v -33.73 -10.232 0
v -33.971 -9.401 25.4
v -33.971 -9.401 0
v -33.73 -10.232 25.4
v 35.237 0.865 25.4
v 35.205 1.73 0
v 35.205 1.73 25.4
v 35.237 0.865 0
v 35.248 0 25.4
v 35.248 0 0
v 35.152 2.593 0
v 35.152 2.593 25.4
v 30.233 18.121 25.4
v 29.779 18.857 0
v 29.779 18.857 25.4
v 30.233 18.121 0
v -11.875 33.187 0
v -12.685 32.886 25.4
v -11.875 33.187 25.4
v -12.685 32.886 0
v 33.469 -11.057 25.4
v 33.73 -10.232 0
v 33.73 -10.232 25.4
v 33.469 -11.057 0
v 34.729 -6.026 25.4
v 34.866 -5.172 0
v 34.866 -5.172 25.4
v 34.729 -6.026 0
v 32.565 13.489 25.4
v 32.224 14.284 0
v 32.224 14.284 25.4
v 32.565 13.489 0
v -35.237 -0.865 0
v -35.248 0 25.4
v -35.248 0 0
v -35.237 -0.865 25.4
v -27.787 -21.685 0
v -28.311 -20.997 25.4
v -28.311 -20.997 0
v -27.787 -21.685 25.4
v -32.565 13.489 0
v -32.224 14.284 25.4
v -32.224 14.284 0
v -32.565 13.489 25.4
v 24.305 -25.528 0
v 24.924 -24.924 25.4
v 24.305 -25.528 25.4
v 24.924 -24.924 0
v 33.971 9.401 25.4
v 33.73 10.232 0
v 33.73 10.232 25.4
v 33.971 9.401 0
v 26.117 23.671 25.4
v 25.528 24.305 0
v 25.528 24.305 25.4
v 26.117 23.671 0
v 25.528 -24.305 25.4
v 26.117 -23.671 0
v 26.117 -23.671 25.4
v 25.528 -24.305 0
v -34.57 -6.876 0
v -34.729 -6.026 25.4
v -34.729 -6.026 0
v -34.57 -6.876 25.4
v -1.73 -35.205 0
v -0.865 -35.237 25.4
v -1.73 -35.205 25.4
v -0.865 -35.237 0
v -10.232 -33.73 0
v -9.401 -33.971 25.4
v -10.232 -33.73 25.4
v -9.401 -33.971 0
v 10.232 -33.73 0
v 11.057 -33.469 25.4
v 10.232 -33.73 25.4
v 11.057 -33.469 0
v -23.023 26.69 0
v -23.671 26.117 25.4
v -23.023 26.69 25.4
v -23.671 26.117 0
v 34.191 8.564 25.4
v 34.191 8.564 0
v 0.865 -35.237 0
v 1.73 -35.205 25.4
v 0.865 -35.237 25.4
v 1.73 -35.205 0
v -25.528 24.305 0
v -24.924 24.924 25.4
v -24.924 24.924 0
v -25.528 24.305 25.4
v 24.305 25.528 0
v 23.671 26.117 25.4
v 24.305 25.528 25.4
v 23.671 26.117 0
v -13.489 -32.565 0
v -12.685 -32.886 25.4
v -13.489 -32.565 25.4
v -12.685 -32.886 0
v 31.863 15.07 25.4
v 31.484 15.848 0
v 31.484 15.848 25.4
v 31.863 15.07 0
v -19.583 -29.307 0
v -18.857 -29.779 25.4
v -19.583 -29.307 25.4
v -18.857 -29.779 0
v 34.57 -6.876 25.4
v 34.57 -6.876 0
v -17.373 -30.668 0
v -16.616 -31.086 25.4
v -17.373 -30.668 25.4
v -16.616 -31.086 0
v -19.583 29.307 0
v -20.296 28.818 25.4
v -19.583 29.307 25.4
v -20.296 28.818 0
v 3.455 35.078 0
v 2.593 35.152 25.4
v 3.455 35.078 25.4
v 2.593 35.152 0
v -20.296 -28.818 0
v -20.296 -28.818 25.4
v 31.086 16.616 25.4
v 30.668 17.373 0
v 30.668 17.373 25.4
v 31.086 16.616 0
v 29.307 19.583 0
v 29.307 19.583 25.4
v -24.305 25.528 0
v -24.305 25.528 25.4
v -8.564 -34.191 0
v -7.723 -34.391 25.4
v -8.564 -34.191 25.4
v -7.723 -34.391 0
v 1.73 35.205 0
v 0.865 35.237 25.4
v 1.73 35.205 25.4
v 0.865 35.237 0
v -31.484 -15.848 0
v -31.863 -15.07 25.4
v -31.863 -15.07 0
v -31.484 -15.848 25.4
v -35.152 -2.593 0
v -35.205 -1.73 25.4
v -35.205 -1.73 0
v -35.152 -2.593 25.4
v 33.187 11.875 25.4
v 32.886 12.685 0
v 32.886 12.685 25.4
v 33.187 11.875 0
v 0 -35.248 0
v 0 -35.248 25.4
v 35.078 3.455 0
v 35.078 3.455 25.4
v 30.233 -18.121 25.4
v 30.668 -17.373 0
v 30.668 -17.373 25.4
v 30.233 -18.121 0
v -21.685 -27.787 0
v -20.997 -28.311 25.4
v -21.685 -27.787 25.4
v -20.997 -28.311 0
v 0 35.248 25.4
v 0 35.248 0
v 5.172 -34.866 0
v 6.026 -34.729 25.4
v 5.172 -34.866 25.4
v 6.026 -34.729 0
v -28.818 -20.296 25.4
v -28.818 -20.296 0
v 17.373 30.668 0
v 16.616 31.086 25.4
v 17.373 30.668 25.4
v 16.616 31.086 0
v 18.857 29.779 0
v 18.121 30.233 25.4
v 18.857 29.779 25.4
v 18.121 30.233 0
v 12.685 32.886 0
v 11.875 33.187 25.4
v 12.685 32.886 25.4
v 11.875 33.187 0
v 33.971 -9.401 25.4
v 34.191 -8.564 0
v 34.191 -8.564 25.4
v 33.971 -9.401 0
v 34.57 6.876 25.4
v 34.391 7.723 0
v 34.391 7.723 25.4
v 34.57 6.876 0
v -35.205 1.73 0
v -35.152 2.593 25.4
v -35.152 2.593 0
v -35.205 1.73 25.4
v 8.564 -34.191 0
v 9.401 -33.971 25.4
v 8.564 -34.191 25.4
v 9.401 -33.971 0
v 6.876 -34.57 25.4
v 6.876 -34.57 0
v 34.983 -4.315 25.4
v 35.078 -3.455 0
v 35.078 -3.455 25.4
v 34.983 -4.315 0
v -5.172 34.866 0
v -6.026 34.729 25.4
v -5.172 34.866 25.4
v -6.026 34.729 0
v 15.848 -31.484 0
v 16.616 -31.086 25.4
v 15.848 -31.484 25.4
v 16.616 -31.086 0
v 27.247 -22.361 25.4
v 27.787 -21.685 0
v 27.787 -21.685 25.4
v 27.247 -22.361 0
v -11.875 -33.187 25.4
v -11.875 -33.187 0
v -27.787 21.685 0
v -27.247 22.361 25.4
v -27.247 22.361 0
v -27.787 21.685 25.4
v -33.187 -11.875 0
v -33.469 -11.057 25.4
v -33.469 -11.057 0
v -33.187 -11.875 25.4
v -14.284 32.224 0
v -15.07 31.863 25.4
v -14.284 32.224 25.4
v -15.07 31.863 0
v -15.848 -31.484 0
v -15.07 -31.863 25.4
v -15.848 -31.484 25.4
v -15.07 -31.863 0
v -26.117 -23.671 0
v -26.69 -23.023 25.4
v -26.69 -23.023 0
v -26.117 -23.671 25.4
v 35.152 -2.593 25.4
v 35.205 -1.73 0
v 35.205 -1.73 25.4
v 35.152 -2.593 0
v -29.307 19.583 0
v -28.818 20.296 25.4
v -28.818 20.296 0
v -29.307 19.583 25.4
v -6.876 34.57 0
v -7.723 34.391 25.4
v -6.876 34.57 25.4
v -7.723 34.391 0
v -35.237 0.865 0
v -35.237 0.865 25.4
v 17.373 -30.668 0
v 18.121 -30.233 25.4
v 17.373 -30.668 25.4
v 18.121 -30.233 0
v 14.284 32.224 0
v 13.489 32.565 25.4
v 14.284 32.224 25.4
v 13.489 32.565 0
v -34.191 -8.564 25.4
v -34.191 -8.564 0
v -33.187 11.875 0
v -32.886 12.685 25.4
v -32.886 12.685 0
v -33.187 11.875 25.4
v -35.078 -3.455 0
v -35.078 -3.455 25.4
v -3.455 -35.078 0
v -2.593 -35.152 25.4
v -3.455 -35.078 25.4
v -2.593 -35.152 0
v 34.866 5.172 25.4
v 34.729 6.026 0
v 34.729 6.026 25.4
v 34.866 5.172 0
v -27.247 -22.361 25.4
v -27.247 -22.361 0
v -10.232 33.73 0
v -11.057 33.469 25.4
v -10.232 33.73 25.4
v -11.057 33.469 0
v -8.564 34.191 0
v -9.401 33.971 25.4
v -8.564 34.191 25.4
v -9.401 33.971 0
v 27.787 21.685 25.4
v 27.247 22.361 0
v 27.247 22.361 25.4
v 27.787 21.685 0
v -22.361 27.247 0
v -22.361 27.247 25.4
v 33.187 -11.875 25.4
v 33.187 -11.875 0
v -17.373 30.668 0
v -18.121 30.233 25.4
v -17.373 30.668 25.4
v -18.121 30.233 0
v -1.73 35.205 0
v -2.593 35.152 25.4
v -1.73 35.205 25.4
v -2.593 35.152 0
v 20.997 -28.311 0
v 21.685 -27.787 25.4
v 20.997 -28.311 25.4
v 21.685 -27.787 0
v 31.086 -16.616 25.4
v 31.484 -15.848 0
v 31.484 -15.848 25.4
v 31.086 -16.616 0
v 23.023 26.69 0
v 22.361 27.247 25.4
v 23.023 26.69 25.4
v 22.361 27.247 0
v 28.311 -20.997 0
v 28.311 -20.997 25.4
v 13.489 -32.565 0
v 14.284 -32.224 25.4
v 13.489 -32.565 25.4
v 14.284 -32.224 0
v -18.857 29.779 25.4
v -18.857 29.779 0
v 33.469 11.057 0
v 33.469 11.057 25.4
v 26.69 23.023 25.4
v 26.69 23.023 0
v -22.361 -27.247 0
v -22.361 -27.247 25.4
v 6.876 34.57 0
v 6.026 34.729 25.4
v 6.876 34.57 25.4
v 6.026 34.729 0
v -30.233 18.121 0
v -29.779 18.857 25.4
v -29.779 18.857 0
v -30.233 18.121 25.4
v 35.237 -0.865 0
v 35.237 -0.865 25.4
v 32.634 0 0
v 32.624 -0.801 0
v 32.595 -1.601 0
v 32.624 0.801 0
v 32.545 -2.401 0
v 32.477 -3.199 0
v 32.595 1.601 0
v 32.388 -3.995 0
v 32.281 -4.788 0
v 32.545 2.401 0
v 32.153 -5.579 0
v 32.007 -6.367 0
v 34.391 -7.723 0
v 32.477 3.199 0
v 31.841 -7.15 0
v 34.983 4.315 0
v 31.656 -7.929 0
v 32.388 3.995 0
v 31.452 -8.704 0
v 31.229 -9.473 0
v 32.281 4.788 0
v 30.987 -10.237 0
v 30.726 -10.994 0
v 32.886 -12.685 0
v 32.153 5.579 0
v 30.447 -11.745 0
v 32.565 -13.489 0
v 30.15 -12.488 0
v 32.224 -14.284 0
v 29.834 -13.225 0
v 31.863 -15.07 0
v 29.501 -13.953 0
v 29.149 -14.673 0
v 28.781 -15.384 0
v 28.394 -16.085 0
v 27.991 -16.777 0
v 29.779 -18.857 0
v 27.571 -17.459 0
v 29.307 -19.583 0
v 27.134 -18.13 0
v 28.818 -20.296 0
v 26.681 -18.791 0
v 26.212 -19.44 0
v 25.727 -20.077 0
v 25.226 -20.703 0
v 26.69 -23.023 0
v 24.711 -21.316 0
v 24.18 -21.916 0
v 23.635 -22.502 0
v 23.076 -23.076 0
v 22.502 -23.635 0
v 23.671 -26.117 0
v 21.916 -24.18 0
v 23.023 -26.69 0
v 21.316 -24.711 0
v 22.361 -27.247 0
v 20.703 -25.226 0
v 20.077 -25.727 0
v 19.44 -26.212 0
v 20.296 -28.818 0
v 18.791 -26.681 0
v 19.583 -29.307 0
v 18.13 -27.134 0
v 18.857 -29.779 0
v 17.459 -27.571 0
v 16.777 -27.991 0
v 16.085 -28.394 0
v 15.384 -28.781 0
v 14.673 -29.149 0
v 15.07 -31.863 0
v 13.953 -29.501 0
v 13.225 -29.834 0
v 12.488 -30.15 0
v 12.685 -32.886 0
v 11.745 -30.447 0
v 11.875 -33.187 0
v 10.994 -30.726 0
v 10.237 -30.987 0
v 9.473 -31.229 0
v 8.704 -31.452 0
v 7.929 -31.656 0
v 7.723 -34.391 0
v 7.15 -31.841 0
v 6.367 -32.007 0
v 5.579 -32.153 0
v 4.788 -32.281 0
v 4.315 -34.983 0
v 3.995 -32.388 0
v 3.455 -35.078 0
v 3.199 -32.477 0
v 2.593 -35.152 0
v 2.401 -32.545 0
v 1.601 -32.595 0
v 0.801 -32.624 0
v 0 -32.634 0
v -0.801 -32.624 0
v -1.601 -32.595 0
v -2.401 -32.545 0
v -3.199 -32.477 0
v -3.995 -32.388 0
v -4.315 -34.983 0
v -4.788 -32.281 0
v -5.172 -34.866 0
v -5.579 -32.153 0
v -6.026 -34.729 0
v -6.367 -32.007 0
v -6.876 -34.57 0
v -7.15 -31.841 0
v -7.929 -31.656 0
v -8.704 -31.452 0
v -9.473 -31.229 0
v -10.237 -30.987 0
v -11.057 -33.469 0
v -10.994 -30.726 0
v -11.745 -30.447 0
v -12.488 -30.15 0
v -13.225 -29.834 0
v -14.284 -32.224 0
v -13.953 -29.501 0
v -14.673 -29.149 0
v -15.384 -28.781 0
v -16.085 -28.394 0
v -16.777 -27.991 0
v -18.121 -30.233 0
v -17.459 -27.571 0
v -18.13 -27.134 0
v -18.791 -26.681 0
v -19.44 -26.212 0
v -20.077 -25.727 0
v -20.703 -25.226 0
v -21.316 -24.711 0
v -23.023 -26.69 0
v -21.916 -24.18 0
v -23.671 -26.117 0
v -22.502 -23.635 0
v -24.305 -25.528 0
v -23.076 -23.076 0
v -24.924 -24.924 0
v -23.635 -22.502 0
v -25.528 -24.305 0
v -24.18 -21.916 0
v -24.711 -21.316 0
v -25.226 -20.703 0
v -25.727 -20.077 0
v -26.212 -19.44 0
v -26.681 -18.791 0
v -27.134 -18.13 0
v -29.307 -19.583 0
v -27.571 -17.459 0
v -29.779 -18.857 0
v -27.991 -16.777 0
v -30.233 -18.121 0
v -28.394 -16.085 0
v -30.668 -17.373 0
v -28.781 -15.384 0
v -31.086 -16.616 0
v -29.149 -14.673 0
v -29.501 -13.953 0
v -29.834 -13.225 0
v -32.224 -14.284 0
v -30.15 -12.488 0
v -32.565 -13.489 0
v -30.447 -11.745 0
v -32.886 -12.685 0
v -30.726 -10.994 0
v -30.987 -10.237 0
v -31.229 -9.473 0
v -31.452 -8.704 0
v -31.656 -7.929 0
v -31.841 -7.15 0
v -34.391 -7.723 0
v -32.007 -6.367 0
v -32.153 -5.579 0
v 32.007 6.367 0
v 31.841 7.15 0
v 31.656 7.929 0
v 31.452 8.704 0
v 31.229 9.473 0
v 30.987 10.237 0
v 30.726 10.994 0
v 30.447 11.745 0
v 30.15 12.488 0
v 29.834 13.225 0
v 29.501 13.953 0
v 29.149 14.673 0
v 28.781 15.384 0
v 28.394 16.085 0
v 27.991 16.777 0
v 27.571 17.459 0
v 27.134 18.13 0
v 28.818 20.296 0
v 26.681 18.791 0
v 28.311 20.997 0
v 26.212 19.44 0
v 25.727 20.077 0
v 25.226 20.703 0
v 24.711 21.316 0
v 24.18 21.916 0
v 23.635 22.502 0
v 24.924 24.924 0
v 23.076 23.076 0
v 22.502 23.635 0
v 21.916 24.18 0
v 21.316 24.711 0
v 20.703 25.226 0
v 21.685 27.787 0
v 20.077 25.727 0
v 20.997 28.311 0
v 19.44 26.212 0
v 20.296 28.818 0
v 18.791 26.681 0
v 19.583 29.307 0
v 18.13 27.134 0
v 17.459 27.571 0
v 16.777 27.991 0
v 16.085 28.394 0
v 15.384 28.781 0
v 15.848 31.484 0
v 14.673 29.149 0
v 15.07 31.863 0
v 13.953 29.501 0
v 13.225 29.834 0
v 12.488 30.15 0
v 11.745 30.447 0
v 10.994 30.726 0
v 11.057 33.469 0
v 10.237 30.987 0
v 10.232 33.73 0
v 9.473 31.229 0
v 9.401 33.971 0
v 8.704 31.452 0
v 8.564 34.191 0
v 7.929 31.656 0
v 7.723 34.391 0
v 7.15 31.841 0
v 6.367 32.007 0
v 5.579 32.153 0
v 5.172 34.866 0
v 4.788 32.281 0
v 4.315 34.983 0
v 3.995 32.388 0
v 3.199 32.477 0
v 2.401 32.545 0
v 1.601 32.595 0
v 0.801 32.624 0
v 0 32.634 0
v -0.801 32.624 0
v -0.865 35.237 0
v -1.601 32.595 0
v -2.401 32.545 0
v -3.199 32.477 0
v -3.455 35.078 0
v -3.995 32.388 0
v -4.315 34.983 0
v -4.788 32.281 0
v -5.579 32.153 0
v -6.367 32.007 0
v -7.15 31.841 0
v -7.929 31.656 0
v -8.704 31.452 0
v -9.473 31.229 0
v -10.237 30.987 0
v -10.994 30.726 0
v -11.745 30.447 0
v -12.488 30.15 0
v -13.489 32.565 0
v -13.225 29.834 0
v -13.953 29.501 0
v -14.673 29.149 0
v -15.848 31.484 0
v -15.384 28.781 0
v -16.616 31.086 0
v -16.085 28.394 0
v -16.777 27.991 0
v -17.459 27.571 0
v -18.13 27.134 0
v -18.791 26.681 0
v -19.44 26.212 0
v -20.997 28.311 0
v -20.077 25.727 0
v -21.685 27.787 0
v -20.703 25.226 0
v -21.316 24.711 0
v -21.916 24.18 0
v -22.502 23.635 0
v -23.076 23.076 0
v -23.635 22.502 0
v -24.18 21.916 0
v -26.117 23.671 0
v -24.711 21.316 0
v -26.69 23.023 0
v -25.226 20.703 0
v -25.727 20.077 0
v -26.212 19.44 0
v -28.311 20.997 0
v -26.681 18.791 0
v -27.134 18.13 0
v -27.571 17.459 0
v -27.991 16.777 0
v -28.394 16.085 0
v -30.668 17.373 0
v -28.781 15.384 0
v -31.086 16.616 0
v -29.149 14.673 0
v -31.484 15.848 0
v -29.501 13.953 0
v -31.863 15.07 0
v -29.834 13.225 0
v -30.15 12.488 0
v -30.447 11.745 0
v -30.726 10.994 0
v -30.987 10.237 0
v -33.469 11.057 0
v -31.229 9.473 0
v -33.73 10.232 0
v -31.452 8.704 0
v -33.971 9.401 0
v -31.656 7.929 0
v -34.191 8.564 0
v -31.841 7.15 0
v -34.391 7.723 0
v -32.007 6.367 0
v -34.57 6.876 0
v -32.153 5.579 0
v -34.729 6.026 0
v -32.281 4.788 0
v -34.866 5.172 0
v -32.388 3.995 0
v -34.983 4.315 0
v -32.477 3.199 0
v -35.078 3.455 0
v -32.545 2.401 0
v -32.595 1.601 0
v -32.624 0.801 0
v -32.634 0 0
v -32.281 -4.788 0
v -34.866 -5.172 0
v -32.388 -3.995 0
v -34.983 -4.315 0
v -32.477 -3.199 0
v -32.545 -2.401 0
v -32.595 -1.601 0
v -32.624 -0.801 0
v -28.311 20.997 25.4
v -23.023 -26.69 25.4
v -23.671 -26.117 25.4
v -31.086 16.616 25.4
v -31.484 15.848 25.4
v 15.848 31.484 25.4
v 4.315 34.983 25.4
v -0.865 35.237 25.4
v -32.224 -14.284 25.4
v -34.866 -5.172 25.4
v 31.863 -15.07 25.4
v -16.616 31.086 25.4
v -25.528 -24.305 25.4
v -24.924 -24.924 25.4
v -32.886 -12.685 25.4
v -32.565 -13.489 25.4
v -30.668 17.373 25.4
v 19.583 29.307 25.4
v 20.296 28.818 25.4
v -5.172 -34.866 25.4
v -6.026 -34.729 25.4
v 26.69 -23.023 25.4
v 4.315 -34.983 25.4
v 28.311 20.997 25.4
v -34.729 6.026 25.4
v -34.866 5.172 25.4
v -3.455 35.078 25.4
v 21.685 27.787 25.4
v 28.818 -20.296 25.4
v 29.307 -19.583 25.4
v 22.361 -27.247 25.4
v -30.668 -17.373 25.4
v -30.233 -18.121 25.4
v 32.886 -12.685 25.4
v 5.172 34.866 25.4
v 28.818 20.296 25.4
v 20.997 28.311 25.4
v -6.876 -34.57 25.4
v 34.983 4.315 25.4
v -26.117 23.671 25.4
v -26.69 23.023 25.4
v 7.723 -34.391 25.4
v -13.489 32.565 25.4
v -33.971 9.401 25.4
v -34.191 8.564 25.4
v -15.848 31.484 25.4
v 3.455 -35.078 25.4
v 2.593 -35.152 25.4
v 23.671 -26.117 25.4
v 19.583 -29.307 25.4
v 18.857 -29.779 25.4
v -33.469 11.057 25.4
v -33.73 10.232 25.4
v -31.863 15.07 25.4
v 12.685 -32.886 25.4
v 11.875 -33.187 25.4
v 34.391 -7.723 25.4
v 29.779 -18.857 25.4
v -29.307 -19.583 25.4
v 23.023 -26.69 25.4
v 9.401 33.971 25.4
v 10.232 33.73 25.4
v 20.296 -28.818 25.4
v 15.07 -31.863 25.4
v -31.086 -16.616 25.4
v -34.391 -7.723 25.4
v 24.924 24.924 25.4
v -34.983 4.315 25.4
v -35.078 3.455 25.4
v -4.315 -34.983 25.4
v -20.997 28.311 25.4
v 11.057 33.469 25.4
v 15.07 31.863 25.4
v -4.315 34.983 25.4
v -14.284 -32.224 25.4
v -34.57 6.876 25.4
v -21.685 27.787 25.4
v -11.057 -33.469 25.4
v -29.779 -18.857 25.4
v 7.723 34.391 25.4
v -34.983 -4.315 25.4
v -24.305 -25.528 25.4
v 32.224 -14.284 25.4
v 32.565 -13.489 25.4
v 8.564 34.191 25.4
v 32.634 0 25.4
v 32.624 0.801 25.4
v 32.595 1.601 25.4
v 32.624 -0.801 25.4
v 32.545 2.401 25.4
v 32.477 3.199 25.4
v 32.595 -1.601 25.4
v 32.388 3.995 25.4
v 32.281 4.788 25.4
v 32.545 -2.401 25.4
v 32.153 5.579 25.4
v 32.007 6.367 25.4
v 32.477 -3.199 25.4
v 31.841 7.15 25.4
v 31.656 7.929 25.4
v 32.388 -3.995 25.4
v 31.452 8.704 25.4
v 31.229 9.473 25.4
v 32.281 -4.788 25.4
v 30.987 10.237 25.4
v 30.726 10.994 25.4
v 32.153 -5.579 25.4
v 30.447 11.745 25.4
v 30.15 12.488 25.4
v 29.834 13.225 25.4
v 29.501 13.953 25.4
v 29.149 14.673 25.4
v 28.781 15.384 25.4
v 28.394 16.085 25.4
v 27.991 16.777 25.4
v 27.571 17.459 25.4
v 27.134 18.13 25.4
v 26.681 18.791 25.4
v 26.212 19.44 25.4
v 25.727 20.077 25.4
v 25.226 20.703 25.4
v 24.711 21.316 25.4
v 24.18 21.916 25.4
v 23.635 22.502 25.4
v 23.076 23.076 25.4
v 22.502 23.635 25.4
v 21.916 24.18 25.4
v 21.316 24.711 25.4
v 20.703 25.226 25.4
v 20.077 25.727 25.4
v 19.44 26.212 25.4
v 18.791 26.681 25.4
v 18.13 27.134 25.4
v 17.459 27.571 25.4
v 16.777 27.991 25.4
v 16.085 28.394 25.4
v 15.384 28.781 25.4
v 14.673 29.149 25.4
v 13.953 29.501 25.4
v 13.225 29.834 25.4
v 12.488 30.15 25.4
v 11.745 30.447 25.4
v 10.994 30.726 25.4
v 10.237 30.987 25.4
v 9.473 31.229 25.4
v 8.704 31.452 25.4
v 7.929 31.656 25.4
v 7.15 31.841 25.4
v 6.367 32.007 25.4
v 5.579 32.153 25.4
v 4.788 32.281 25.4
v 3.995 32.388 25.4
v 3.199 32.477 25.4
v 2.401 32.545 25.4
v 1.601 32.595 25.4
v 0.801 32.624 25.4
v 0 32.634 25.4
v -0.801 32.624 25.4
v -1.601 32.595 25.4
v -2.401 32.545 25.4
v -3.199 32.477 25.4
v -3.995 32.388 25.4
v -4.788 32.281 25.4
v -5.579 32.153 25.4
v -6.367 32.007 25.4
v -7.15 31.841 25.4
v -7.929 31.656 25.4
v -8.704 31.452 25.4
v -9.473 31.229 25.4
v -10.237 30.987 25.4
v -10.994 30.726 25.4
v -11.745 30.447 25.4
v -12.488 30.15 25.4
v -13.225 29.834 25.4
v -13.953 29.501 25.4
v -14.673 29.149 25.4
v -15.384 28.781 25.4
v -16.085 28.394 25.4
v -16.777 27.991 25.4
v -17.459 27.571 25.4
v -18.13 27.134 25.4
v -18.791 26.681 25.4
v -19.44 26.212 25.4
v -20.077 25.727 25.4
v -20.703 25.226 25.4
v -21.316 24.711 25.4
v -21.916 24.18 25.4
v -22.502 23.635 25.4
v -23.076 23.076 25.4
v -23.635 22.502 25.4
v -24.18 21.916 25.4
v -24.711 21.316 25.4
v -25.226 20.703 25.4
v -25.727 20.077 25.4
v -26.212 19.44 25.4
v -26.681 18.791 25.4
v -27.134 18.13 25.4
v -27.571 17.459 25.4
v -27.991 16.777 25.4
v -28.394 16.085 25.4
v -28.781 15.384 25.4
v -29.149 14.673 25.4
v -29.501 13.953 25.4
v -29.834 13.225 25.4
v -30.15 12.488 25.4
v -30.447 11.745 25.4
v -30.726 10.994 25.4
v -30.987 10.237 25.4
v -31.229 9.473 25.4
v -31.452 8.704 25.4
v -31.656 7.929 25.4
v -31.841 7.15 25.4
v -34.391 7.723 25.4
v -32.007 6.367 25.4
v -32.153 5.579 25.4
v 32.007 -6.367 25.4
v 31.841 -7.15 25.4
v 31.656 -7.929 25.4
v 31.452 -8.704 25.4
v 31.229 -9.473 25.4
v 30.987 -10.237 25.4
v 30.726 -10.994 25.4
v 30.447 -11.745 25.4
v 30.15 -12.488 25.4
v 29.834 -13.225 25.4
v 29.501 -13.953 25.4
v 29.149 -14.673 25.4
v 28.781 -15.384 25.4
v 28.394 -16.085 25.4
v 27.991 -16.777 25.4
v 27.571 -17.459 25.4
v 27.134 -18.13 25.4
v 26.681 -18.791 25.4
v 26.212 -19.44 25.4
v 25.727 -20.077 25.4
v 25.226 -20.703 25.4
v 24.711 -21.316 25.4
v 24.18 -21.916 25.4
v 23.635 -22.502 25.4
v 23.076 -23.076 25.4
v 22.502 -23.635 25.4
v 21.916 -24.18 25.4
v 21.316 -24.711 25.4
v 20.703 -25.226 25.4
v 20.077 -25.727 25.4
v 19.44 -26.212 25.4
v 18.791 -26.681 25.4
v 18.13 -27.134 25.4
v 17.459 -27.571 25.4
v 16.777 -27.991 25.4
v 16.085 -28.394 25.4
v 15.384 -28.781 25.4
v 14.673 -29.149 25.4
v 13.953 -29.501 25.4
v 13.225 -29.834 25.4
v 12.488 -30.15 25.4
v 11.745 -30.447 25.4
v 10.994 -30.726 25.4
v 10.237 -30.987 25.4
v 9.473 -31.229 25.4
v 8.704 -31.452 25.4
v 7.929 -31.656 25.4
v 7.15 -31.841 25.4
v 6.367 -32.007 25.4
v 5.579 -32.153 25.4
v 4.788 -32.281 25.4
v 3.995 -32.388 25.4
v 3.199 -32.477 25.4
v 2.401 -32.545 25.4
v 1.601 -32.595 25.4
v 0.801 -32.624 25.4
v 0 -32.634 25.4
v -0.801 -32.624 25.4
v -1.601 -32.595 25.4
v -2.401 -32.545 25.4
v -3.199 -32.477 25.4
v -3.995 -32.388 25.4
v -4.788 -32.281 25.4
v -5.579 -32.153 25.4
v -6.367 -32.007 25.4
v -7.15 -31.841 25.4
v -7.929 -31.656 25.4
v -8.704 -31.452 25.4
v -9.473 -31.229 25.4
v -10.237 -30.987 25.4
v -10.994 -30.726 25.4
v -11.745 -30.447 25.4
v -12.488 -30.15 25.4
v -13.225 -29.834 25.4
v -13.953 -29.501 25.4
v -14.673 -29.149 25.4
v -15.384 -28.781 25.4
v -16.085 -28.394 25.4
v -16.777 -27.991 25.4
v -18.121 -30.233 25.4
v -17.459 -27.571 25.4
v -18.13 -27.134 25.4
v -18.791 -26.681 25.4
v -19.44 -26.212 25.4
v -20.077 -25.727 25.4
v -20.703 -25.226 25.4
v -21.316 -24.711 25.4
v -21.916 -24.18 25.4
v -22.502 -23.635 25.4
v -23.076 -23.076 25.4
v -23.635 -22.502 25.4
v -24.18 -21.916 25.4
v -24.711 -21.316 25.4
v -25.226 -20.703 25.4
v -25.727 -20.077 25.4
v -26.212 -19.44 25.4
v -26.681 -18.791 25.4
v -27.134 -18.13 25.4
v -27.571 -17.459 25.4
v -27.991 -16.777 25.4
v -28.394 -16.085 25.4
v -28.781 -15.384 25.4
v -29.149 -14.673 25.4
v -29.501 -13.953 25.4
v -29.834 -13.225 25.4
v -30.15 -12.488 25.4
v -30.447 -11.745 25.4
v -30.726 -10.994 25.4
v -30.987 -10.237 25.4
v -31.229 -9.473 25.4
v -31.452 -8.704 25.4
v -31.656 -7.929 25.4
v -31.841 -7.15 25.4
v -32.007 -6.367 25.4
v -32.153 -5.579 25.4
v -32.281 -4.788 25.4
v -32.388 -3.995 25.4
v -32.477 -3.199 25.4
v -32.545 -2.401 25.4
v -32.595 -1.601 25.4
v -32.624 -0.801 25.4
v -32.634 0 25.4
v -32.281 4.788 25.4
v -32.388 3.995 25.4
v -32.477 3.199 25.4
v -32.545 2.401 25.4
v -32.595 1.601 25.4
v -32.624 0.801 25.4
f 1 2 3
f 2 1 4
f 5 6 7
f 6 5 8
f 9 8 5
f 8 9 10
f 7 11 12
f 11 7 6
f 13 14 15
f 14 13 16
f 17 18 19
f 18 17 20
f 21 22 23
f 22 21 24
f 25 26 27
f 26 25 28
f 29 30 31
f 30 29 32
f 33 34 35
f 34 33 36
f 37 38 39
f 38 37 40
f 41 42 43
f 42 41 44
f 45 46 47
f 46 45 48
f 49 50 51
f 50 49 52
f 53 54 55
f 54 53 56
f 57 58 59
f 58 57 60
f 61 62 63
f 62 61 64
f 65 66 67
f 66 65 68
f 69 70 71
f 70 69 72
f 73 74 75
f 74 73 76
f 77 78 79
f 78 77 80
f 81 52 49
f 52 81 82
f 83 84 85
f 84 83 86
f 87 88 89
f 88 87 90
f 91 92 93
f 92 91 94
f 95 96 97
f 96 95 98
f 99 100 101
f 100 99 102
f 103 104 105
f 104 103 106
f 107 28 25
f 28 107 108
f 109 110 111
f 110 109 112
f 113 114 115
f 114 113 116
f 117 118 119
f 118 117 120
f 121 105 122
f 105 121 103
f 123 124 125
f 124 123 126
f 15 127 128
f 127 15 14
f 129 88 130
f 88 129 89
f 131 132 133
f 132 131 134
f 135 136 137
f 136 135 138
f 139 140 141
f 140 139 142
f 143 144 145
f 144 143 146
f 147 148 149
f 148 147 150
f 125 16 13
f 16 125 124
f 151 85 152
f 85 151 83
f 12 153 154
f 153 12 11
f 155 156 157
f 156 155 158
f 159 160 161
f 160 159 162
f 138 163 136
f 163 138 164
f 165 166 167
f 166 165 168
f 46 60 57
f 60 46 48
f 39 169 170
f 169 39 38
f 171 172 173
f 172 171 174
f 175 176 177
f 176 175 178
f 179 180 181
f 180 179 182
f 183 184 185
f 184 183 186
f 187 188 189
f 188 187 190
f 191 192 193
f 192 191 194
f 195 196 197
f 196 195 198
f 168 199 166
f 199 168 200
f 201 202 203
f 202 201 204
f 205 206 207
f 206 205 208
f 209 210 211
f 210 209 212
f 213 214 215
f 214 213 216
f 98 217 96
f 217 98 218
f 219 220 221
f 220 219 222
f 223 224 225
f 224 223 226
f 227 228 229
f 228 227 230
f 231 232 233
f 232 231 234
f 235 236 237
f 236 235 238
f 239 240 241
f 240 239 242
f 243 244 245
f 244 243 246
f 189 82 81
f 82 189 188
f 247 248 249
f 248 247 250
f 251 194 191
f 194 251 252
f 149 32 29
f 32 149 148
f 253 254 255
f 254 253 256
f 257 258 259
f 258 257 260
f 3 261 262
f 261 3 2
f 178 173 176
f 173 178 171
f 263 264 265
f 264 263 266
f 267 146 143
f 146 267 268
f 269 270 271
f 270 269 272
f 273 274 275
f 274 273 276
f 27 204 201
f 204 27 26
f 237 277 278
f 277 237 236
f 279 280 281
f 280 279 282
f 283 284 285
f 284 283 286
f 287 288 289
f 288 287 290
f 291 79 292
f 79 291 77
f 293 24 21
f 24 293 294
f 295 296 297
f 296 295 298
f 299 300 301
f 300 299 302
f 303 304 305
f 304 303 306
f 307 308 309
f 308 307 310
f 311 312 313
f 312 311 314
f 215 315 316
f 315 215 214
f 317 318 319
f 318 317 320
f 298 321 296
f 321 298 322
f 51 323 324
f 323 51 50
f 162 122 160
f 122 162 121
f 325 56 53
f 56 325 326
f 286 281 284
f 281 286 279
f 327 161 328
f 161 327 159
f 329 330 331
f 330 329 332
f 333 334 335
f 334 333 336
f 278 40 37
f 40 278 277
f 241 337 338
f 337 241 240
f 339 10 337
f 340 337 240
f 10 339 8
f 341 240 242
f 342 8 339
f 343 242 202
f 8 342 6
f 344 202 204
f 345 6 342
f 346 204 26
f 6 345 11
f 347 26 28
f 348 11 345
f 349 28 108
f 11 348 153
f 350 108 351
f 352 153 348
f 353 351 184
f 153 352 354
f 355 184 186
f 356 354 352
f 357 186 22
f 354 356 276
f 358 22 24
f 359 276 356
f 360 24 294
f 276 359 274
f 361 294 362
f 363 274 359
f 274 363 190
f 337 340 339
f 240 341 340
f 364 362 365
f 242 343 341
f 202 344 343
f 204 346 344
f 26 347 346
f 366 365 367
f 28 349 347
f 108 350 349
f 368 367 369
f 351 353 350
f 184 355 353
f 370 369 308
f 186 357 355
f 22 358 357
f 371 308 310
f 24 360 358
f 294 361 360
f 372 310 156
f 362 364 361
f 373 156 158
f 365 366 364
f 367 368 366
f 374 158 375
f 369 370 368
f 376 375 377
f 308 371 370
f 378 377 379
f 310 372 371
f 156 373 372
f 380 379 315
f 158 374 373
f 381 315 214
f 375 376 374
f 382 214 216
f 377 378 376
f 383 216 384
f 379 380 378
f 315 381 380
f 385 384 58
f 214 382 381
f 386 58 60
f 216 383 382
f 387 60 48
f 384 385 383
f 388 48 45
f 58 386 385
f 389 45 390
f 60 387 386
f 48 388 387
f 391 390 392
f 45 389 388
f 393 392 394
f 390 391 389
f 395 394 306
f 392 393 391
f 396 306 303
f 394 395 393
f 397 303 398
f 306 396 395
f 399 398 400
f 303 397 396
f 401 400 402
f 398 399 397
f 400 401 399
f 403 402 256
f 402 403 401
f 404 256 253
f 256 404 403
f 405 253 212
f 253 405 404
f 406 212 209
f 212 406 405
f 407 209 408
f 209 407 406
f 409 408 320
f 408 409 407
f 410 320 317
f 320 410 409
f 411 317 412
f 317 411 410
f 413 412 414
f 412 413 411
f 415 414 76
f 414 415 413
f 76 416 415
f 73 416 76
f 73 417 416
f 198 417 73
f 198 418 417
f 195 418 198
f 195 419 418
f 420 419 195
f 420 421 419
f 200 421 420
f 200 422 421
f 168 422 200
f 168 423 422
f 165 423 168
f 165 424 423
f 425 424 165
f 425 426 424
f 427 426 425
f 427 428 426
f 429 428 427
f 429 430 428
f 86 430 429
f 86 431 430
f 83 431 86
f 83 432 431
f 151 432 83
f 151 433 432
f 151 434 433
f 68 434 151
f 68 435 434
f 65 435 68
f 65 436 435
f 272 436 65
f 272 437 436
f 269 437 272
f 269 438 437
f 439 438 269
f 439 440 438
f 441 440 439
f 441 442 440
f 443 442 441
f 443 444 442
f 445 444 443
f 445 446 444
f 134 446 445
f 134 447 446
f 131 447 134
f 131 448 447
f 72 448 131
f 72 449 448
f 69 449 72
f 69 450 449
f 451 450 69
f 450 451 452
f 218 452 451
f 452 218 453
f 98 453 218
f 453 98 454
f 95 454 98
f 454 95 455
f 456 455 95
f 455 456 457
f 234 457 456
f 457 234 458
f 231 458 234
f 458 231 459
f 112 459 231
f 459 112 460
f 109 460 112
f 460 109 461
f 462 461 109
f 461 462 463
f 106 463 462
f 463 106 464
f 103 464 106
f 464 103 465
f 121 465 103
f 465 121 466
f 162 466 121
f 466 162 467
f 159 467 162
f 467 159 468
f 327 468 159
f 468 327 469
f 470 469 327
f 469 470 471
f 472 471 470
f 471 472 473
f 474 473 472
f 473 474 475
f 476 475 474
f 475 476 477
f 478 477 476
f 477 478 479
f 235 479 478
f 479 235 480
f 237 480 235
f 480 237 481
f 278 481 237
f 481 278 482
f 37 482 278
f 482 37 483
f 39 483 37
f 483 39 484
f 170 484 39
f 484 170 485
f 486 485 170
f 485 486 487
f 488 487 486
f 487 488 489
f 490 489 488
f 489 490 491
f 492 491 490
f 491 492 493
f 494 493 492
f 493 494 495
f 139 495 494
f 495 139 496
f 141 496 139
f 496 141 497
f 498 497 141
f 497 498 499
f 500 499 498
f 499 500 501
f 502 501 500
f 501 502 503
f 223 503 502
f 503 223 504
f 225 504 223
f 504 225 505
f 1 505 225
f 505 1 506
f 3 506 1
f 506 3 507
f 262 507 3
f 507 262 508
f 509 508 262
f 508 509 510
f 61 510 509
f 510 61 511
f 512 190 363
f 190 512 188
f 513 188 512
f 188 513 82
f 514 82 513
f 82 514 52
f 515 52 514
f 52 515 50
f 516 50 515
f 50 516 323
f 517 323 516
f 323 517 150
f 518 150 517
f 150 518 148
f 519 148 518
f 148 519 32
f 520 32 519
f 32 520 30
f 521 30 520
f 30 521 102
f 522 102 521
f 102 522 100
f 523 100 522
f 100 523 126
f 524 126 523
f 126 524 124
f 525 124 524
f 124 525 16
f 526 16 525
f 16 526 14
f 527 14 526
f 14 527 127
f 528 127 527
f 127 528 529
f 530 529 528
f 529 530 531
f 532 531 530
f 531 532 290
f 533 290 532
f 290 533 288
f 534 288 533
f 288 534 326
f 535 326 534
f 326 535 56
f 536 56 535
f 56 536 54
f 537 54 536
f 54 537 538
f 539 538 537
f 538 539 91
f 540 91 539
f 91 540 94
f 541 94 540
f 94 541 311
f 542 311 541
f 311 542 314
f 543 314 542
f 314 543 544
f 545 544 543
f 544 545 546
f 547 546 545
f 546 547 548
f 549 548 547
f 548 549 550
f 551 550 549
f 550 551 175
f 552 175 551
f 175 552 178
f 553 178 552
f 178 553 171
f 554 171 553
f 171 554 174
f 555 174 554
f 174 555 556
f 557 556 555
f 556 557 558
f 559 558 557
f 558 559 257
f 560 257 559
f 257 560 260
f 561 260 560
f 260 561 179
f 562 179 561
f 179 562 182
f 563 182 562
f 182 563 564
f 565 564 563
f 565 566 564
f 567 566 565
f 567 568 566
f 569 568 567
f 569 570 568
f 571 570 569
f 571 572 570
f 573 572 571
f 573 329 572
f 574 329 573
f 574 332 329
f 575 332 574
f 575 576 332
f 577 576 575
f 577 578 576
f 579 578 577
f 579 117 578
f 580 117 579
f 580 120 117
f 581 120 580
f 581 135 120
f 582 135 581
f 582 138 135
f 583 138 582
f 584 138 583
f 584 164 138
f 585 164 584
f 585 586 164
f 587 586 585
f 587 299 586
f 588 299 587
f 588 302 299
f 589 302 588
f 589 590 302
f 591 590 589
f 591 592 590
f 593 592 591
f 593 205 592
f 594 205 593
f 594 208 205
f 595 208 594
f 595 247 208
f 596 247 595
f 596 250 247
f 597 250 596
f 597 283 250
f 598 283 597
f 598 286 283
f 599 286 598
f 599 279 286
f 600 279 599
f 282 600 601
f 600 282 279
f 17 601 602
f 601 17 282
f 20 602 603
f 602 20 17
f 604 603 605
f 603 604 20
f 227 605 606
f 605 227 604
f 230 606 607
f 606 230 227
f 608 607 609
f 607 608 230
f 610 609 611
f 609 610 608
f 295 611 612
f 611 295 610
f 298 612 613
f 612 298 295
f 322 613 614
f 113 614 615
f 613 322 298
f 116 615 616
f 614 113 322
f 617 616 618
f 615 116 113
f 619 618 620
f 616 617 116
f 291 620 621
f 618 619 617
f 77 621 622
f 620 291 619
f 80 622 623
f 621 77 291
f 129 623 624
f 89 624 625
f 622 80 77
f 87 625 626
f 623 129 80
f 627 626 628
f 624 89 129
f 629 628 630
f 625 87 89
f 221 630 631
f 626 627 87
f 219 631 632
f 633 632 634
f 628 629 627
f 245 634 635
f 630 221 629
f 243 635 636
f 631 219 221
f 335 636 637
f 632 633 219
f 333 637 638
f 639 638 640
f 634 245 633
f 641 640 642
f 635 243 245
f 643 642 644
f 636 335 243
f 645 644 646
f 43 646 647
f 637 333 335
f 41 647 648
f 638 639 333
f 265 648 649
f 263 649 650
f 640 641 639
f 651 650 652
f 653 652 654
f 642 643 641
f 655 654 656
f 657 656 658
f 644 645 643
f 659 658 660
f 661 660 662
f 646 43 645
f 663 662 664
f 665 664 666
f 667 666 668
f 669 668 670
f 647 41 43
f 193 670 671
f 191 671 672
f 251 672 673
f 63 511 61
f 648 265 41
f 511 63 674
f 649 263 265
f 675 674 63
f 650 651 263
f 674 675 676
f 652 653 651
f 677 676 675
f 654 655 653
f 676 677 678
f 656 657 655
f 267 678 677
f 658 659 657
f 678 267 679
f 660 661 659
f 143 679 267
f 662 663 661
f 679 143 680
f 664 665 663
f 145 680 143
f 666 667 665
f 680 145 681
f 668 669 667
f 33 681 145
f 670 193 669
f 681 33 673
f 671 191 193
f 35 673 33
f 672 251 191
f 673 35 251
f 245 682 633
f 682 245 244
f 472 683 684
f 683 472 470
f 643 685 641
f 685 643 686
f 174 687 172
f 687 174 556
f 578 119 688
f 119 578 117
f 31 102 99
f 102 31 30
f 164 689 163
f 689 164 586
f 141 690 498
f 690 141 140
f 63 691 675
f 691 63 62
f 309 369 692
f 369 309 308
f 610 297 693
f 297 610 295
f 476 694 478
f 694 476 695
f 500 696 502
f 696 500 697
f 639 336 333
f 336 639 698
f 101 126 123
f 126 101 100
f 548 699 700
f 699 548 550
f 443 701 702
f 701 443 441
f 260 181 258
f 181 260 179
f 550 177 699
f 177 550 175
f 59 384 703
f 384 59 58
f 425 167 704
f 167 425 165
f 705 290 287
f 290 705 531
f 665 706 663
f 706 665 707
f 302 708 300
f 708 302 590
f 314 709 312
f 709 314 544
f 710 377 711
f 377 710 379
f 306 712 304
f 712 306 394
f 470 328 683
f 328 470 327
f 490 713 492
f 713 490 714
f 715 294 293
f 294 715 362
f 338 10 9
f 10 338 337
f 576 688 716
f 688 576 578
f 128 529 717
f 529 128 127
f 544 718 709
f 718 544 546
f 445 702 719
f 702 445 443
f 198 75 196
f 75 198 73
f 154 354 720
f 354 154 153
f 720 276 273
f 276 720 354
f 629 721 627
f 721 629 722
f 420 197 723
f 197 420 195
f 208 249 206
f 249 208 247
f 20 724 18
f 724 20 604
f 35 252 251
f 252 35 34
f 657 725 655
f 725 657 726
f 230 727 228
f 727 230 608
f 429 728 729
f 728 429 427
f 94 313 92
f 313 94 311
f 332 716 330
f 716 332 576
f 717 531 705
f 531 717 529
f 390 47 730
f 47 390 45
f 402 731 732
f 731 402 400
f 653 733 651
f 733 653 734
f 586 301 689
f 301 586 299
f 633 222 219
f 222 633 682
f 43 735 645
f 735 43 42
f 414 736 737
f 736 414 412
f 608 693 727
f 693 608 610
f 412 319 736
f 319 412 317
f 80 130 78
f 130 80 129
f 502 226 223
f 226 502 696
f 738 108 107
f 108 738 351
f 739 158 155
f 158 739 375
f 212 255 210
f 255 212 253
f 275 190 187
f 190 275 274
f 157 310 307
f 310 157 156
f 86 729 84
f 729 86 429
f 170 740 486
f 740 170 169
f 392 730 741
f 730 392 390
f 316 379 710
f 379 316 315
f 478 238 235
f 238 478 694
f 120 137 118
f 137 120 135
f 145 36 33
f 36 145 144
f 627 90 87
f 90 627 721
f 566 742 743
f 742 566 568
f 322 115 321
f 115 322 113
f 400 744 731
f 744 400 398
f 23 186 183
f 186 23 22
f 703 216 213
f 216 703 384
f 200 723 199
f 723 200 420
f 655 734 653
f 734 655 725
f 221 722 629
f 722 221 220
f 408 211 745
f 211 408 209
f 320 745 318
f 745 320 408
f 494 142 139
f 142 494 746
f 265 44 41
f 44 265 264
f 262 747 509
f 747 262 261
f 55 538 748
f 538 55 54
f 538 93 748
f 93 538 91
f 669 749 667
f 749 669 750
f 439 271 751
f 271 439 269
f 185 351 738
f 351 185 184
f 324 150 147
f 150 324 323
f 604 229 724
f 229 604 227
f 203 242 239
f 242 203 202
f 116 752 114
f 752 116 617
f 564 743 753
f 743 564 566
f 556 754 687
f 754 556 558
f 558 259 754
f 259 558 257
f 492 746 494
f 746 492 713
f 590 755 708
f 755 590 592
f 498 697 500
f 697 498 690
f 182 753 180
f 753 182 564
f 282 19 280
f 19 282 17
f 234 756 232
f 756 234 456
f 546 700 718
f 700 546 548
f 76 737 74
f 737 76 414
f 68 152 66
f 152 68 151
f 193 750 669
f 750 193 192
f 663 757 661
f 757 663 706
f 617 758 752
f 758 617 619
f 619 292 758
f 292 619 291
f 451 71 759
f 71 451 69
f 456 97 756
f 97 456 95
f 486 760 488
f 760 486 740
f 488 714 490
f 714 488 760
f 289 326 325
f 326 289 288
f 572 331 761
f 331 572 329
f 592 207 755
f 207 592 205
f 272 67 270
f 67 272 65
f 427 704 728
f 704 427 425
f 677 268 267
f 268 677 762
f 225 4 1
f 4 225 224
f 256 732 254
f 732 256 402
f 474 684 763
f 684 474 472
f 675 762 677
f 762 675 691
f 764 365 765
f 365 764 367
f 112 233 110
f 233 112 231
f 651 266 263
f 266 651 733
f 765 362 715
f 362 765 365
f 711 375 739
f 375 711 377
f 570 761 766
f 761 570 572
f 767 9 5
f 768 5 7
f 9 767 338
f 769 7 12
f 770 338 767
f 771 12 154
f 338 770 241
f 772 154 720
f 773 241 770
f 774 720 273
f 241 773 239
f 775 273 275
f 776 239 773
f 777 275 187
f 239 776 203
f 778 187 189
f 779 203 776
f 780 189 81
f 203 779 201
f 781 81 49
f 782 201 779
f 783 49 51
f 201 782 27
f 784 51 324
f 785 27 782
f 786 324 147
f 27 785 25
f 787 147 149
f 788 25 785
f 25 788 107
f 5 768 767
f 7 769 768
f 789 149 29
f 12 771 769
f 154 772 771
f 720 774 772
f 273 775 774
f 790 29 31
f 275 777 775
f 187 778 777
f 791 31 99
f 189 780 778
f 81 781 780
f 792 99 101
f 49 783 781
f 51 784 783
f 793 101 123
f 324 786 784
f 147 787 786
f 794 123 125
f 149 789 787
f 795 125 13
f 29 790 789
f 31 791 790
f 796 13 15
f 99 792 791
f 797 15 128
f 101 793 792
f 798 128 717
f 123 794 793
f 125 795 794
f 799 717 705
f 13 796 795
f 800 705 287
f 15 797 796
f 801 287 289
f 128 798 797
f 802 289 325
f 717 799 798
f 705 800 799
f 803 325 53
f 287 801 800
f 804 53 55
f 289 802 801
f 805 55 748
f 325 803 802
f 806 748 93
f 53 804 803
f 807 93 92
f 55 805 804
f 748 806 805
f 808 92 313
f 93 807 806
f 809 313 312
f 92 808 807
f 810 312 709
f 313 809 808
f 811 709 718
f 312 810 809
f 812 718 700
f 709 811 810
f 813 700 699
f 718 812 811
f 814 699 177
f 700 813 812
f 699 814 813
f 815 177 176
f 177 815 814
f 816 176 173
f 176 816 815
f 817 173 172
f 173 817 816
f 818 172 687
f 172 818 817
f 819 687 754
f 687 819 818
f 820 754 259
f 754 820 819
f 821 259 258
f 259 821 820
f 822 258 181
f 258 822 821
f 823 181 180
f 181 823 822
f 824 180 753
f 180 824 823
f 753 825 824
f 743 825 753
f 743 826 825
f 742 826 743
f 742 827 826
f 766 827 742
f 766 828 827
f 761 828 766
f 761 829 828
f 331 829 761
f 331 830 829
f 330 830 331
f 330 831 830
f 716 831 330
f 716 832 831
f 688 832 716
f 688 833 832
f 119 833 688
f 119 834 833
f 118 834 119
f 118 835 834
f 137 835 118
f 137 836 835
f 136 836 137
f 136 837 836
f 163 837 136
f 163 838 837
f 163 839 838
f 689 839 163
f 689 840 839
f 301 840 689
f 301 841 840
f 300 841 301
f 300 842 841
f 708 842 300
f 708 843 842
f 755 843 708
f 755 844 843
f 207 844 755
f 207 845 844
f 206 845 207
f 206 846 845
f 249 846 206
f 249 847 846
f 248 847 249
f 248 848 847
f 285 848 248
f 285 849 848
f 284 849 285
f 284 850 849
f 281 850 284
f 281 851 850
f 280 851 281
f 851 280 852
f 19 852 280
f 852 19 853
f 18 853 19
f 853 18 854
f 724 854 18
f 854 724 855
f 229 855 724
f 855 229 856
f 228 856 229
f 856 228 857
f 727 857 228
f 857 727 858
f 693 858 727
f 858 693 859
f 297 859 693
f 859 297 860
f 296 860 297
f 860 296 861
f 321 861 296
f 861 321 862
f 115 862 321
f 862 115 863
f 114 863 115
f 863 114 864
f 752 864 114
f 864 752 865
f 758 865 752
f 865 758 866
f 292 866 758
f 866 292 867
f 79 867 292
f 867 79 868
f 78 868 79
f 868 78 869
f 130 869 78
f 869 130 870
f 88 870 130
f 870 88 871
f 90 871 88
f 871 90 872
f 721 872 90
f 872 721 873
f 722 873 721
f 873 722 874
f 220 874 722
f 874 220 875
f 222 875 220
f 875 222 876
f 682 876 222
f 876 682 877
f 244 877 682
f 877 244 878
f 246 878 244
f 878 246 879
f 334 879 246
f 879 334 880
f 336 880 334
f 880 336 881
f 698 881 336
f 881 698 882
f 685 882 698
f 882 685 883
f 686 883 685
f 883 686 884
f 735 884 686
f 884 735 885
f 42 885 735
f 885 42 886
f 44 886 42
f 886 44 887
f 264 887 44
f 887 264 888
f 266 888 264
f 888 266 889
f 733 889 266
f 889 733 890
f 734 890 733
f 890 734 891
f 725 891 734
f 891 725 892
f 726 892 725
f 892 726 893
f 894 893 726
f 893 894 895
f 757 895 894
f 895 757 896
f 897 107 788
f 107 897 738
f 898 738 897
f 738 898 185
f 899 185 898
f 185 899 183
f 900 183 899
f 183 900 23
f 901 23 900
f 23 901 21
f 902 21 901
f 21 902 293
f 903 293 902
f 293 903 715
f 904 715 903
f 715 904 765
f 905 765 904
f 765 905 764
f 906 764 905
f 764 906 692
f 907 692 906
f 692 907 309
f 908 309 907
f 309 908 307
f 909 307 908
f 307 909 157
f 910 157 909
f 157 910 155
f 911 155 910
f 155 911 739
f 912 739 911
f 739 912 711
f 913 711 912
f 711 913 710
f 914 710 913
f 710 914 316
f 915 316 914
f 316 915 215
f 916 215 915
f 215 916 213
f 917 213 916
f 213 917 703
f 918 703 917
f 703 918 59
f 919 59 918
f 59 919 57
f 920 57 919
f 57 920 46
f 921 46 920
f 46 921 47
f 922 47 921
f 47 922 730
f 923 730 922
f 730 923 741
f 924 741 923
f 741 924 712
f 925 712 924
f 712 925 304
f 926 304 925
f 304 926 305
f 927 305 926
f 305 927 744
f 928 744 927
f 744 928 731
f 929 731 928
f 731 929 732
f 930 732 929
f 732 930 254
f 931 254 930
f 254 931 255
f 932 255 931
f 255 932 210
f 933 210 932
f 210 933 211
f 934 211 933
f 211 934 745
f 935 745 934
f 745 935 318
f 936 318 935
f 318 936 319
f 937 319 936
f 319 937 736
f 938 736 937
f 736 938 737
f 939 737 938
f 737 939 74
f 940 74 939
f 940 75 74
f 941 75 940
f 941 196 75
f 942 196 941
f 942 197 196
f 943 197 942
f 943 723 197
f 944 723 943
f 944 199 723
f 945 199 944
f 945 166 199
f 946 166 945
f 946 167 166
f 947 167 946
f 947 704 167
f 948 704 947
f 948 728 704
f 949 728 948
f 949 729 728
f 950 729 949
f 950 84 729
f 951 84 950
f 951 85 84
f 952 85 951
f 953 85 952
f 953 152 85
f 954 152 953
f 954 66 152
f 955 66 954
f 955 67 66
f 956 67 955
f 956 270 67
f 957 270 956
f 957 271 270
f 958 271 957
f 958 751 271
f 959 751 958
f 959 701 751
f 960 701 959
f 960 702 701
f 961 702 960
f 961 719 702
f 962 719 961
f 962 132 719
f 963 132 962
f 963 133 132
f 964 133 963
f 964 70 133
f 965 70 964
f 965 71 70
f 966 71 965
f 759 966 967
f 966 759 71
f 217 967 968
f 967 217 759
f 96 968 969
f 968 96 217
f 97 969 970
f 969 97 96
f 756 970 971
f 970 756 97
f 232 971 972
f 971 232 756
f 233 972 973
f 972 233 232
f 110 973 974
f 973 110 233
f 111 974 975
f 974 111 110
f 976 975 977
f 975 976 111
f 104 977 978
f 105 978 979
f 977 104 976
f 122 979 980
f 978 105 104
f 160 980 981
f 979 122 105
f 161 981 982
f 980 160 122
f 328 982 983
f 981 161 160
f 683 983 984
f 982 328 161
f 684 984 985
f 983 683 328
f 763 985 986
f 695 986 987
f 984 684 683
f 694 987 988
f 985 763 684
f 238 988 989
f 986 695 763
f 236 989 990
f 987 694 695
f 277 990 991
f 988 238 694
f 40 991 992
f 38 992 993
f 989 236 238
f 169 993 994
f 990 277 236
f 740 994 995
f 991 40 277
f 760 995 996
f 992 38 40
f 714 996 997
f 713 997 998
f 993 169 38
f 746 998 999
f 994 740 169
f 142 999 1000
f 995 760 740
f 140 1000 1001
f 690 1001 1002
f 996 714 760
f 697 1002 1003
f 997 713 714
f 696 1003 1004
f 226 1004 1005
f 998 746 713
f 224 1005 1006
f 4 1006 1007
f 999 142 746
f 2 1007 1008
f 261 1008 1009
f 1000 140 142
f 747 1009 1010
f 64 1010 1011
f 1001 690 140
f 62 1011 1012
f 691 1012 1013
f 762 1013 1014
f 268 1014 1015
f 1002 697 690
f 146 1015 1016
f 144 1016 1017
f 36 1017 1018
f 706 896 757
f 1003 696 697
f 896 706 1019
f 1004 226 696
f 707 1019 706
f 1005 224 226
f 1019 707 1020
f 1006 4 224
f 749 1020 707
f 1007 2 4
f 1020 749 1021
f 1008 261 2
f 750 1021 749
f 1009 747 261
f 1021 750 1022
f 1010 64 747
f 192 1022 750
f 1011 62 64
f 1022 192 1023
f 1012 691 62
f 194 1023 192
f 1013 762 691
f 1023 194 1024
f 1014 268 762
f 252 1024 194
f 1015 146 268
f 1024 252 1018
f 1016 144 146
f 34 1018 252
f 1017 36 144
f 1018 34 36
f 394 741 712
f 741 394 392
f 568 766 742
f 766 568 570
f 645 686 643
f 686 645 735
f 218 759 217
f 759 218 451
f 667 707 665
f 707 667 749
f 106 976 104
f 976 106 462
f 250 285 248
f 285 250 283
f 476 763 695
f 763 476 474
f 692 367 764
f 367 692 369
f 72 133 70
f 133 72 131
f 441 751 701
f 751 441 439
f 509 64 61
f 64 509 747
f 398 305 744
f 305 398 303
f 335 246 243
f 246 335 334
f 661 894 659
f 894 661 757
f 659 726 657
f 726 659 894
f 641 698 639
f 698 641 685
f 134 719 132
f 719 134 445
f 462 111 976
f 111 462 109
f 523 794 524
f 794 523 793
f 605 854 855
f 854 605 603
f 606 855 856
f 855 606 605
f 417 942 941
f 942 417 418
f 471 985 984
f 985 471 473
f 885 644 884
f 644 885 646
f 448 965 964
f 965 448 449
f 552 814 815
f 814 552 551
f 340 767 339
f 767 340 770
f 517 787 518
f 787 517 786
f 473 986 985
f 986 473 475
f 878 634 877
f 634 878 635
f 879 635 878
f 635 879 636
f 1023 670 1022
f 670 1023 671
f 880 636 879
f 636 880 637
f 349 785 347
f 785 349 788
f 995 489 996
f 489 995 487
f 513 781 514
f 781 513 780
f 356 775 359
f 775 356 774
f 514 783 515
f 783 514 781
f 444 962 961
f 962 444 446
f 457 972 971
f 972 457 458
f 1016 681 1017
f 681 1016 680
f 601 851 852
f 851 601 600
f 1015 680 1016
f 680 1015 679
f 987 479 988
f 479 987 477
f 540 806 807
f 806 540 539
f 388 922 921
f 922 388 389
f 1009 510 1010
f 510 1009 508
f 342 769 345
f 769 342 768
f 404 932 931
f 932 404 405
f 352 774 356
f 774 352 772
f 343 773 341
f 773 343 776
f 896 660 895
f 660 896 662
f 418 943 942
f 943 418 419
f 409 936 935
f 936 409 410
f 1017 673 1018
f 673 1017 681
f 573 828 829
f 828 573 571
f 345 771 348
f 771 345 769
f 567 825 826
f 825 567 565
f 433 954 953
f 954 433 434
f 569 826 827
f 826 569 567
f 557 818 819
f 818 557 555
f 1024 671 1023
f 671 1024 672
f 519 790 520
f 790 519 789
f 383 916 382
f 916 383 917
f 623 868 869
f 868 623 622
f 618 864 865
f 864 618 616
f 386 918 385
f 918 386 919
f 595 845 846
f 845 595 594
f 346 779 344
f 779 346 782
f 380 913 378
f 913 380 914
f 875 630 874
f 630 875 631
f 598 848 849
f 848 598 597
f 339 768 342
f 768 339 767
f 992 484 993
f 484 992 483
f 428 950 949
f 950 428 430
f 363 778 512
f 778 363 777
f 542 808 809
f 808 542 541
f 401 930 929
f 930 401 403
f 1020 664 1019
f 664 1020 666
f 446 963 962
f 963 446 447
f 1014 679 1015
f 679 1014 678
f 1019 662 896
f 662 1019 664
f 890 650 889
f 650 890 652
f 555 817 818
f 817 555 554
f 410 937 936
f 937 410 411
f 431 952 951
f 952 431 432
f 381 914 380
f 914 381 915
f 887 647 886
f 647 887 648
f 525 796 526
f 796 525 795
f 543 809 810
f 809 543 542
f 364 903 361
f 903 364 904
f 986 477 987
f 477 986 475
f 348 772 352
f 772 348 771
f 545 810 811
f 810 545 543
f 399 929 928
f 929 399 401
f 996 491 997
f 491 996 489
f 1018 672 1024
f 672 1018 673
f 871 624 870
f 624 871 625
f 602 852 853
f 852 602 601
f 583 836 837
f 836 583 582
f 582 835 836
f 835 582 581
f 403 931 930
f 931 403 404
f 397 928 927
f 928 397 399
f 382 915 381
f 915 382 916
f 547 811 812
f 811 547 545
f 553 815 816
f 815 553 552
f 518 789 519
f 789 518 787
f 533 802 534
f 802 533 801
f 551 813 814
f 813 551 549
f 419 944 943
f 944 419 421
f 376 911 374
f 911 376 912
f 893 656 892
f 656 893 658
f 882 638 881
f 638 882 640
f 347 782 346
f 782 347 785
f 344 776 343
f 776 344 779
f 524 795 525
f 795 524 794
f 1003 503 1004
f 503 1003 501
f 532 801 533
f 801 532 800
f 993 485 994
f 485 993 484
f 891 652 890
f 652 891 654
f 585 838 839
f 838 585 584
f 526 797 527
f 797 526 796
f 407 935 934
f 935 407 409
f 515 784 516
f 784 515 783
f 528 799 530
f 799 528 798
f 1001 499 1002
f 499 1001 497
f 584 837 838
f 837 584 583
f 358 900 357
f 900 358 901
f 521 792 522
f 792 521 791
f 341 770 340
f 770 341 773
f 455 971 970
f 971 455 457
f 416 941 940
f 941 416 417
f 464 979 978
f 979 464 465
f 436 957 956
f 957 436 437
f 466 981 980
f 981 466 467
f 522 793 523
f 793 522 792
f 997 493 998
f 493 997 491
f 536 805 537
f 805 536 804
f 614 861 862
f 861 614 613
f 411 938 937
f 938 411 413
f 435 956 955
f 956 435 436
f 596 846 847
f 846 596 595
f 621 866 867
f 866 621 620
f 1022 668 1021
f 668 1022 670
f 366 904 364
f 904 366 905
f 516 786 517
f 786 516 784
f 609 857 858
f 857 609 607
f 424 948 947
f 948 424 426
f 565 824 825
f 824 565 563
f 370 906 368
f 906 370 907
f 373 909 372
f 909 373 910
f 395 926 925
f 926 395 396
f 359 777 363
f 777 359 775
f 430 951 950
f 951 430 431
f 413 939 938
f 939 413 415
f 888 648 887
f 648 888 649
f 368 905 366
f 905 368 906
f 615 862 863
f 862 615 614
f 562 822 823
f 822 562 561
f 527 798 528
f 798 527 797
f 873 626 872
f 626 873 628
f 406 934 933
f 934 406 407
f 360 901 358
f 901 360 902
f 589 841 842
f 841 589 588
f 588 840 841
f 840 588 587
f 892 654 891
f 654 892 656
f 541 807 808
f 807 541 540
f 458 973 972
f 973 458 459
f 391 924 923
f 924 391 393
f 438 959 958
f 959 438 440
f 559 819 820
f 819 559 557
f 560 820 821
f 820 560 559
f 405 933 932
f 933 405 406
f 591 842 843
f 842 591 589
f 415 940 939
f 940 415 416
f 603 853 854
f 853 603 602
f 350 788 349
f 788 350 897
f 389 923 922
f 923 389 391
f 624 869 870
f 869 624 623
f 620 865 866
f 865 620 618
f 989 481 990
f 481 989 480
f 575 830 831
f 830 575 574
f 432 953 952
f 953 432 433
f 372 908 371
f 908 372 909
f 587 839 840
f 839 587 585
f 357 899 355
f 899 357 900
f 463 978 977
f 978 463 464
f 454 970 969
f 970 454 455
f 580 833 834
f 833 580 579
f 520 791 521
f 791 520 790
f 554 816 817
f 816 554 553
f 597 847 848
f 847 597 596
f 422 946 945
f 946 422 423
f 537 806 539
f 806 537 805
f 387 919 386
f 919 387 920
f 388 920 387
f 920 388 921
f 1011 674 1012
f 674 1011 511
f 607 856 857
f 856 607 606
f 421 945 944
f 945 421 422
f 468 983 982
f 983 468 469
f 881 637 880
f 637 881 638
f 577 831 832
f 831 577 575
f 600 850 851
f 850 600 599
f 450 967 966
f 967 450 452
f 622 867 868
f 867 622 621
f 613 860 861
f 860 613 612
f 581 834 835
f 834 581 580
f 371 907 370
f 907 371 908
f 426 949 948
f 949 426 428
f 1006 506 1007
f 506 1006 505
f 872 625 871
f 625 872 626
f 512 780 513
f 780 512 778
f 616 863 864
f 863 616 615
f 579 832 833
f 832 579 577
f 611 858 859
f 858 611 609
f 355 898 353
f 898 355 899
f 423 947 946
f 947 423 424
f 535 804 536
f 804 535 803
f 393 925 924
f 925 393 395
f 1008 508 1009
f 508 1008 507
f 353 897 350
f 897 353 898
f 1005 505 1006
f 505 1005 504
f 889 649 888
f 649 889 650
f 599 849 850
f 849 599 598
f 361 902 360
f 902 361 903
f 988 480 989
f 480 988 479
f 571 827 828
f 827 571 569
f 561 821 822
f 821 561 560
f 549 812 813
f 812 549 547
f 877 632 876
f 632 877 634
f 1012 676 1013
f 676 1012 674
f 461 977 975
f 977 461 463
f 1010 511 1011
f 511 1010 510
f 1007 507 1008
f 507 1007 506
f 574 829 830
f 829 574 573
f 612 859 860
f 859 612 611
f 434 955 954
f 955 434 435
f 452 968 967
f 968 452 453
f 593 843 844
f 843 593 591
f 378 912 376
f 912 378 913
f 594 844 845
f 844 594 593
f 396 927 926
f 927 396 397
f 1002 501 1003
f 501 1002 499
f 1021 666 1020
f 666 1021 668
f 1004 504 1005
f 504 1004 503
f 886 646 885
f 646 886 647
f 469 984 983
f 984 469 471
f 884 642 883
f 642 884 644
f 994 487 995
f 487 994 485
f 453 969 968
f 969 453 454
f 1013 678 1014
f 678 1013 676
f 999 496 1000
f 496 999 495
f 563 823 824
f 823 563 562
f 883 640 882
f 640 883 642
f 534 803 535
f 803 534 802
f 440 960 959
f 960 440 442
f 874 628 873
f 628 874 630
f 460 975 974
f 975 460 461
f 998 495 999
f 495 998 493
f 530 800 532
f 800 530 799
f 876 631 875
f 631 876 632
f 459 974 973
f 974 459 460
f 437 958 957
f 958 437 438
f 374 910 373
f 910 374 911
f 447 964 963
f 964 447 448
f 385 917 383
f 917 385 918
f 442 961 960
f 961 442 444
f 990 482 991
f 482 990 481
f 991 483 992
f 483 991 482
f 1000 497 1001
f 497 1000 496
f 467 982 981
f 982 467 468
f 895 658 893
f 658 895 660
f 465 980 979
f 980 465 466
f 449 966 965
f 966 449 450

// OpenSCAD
// All units are in Milimeter
$fn = 256;
mm=25.4;

OD = 2.795*mm; // ID of the OpenBuilds Plate
ID = 2.550*mm; // OD of the Performax Router
OD_height = 1.0*mm; // Height of the adapter OD
ID_height = ((OD_height+.5)*mm); // Height of the adapter ID
O_fit=.0196*mm; // fit amount OpenBuilds Plate
P_fit=.0196*mm; // fit amount Performax Router





  // OD taper section to fit attachment
difference() {
  cylinder(
   OD_height,
   d=OD-O_fit,
   center=false
  );
  // Straight section at OD
  translate([0,0,-.5])
  cylinder(
   ID_height,
   d=ID+P_fit,
   center=false
  );
}
